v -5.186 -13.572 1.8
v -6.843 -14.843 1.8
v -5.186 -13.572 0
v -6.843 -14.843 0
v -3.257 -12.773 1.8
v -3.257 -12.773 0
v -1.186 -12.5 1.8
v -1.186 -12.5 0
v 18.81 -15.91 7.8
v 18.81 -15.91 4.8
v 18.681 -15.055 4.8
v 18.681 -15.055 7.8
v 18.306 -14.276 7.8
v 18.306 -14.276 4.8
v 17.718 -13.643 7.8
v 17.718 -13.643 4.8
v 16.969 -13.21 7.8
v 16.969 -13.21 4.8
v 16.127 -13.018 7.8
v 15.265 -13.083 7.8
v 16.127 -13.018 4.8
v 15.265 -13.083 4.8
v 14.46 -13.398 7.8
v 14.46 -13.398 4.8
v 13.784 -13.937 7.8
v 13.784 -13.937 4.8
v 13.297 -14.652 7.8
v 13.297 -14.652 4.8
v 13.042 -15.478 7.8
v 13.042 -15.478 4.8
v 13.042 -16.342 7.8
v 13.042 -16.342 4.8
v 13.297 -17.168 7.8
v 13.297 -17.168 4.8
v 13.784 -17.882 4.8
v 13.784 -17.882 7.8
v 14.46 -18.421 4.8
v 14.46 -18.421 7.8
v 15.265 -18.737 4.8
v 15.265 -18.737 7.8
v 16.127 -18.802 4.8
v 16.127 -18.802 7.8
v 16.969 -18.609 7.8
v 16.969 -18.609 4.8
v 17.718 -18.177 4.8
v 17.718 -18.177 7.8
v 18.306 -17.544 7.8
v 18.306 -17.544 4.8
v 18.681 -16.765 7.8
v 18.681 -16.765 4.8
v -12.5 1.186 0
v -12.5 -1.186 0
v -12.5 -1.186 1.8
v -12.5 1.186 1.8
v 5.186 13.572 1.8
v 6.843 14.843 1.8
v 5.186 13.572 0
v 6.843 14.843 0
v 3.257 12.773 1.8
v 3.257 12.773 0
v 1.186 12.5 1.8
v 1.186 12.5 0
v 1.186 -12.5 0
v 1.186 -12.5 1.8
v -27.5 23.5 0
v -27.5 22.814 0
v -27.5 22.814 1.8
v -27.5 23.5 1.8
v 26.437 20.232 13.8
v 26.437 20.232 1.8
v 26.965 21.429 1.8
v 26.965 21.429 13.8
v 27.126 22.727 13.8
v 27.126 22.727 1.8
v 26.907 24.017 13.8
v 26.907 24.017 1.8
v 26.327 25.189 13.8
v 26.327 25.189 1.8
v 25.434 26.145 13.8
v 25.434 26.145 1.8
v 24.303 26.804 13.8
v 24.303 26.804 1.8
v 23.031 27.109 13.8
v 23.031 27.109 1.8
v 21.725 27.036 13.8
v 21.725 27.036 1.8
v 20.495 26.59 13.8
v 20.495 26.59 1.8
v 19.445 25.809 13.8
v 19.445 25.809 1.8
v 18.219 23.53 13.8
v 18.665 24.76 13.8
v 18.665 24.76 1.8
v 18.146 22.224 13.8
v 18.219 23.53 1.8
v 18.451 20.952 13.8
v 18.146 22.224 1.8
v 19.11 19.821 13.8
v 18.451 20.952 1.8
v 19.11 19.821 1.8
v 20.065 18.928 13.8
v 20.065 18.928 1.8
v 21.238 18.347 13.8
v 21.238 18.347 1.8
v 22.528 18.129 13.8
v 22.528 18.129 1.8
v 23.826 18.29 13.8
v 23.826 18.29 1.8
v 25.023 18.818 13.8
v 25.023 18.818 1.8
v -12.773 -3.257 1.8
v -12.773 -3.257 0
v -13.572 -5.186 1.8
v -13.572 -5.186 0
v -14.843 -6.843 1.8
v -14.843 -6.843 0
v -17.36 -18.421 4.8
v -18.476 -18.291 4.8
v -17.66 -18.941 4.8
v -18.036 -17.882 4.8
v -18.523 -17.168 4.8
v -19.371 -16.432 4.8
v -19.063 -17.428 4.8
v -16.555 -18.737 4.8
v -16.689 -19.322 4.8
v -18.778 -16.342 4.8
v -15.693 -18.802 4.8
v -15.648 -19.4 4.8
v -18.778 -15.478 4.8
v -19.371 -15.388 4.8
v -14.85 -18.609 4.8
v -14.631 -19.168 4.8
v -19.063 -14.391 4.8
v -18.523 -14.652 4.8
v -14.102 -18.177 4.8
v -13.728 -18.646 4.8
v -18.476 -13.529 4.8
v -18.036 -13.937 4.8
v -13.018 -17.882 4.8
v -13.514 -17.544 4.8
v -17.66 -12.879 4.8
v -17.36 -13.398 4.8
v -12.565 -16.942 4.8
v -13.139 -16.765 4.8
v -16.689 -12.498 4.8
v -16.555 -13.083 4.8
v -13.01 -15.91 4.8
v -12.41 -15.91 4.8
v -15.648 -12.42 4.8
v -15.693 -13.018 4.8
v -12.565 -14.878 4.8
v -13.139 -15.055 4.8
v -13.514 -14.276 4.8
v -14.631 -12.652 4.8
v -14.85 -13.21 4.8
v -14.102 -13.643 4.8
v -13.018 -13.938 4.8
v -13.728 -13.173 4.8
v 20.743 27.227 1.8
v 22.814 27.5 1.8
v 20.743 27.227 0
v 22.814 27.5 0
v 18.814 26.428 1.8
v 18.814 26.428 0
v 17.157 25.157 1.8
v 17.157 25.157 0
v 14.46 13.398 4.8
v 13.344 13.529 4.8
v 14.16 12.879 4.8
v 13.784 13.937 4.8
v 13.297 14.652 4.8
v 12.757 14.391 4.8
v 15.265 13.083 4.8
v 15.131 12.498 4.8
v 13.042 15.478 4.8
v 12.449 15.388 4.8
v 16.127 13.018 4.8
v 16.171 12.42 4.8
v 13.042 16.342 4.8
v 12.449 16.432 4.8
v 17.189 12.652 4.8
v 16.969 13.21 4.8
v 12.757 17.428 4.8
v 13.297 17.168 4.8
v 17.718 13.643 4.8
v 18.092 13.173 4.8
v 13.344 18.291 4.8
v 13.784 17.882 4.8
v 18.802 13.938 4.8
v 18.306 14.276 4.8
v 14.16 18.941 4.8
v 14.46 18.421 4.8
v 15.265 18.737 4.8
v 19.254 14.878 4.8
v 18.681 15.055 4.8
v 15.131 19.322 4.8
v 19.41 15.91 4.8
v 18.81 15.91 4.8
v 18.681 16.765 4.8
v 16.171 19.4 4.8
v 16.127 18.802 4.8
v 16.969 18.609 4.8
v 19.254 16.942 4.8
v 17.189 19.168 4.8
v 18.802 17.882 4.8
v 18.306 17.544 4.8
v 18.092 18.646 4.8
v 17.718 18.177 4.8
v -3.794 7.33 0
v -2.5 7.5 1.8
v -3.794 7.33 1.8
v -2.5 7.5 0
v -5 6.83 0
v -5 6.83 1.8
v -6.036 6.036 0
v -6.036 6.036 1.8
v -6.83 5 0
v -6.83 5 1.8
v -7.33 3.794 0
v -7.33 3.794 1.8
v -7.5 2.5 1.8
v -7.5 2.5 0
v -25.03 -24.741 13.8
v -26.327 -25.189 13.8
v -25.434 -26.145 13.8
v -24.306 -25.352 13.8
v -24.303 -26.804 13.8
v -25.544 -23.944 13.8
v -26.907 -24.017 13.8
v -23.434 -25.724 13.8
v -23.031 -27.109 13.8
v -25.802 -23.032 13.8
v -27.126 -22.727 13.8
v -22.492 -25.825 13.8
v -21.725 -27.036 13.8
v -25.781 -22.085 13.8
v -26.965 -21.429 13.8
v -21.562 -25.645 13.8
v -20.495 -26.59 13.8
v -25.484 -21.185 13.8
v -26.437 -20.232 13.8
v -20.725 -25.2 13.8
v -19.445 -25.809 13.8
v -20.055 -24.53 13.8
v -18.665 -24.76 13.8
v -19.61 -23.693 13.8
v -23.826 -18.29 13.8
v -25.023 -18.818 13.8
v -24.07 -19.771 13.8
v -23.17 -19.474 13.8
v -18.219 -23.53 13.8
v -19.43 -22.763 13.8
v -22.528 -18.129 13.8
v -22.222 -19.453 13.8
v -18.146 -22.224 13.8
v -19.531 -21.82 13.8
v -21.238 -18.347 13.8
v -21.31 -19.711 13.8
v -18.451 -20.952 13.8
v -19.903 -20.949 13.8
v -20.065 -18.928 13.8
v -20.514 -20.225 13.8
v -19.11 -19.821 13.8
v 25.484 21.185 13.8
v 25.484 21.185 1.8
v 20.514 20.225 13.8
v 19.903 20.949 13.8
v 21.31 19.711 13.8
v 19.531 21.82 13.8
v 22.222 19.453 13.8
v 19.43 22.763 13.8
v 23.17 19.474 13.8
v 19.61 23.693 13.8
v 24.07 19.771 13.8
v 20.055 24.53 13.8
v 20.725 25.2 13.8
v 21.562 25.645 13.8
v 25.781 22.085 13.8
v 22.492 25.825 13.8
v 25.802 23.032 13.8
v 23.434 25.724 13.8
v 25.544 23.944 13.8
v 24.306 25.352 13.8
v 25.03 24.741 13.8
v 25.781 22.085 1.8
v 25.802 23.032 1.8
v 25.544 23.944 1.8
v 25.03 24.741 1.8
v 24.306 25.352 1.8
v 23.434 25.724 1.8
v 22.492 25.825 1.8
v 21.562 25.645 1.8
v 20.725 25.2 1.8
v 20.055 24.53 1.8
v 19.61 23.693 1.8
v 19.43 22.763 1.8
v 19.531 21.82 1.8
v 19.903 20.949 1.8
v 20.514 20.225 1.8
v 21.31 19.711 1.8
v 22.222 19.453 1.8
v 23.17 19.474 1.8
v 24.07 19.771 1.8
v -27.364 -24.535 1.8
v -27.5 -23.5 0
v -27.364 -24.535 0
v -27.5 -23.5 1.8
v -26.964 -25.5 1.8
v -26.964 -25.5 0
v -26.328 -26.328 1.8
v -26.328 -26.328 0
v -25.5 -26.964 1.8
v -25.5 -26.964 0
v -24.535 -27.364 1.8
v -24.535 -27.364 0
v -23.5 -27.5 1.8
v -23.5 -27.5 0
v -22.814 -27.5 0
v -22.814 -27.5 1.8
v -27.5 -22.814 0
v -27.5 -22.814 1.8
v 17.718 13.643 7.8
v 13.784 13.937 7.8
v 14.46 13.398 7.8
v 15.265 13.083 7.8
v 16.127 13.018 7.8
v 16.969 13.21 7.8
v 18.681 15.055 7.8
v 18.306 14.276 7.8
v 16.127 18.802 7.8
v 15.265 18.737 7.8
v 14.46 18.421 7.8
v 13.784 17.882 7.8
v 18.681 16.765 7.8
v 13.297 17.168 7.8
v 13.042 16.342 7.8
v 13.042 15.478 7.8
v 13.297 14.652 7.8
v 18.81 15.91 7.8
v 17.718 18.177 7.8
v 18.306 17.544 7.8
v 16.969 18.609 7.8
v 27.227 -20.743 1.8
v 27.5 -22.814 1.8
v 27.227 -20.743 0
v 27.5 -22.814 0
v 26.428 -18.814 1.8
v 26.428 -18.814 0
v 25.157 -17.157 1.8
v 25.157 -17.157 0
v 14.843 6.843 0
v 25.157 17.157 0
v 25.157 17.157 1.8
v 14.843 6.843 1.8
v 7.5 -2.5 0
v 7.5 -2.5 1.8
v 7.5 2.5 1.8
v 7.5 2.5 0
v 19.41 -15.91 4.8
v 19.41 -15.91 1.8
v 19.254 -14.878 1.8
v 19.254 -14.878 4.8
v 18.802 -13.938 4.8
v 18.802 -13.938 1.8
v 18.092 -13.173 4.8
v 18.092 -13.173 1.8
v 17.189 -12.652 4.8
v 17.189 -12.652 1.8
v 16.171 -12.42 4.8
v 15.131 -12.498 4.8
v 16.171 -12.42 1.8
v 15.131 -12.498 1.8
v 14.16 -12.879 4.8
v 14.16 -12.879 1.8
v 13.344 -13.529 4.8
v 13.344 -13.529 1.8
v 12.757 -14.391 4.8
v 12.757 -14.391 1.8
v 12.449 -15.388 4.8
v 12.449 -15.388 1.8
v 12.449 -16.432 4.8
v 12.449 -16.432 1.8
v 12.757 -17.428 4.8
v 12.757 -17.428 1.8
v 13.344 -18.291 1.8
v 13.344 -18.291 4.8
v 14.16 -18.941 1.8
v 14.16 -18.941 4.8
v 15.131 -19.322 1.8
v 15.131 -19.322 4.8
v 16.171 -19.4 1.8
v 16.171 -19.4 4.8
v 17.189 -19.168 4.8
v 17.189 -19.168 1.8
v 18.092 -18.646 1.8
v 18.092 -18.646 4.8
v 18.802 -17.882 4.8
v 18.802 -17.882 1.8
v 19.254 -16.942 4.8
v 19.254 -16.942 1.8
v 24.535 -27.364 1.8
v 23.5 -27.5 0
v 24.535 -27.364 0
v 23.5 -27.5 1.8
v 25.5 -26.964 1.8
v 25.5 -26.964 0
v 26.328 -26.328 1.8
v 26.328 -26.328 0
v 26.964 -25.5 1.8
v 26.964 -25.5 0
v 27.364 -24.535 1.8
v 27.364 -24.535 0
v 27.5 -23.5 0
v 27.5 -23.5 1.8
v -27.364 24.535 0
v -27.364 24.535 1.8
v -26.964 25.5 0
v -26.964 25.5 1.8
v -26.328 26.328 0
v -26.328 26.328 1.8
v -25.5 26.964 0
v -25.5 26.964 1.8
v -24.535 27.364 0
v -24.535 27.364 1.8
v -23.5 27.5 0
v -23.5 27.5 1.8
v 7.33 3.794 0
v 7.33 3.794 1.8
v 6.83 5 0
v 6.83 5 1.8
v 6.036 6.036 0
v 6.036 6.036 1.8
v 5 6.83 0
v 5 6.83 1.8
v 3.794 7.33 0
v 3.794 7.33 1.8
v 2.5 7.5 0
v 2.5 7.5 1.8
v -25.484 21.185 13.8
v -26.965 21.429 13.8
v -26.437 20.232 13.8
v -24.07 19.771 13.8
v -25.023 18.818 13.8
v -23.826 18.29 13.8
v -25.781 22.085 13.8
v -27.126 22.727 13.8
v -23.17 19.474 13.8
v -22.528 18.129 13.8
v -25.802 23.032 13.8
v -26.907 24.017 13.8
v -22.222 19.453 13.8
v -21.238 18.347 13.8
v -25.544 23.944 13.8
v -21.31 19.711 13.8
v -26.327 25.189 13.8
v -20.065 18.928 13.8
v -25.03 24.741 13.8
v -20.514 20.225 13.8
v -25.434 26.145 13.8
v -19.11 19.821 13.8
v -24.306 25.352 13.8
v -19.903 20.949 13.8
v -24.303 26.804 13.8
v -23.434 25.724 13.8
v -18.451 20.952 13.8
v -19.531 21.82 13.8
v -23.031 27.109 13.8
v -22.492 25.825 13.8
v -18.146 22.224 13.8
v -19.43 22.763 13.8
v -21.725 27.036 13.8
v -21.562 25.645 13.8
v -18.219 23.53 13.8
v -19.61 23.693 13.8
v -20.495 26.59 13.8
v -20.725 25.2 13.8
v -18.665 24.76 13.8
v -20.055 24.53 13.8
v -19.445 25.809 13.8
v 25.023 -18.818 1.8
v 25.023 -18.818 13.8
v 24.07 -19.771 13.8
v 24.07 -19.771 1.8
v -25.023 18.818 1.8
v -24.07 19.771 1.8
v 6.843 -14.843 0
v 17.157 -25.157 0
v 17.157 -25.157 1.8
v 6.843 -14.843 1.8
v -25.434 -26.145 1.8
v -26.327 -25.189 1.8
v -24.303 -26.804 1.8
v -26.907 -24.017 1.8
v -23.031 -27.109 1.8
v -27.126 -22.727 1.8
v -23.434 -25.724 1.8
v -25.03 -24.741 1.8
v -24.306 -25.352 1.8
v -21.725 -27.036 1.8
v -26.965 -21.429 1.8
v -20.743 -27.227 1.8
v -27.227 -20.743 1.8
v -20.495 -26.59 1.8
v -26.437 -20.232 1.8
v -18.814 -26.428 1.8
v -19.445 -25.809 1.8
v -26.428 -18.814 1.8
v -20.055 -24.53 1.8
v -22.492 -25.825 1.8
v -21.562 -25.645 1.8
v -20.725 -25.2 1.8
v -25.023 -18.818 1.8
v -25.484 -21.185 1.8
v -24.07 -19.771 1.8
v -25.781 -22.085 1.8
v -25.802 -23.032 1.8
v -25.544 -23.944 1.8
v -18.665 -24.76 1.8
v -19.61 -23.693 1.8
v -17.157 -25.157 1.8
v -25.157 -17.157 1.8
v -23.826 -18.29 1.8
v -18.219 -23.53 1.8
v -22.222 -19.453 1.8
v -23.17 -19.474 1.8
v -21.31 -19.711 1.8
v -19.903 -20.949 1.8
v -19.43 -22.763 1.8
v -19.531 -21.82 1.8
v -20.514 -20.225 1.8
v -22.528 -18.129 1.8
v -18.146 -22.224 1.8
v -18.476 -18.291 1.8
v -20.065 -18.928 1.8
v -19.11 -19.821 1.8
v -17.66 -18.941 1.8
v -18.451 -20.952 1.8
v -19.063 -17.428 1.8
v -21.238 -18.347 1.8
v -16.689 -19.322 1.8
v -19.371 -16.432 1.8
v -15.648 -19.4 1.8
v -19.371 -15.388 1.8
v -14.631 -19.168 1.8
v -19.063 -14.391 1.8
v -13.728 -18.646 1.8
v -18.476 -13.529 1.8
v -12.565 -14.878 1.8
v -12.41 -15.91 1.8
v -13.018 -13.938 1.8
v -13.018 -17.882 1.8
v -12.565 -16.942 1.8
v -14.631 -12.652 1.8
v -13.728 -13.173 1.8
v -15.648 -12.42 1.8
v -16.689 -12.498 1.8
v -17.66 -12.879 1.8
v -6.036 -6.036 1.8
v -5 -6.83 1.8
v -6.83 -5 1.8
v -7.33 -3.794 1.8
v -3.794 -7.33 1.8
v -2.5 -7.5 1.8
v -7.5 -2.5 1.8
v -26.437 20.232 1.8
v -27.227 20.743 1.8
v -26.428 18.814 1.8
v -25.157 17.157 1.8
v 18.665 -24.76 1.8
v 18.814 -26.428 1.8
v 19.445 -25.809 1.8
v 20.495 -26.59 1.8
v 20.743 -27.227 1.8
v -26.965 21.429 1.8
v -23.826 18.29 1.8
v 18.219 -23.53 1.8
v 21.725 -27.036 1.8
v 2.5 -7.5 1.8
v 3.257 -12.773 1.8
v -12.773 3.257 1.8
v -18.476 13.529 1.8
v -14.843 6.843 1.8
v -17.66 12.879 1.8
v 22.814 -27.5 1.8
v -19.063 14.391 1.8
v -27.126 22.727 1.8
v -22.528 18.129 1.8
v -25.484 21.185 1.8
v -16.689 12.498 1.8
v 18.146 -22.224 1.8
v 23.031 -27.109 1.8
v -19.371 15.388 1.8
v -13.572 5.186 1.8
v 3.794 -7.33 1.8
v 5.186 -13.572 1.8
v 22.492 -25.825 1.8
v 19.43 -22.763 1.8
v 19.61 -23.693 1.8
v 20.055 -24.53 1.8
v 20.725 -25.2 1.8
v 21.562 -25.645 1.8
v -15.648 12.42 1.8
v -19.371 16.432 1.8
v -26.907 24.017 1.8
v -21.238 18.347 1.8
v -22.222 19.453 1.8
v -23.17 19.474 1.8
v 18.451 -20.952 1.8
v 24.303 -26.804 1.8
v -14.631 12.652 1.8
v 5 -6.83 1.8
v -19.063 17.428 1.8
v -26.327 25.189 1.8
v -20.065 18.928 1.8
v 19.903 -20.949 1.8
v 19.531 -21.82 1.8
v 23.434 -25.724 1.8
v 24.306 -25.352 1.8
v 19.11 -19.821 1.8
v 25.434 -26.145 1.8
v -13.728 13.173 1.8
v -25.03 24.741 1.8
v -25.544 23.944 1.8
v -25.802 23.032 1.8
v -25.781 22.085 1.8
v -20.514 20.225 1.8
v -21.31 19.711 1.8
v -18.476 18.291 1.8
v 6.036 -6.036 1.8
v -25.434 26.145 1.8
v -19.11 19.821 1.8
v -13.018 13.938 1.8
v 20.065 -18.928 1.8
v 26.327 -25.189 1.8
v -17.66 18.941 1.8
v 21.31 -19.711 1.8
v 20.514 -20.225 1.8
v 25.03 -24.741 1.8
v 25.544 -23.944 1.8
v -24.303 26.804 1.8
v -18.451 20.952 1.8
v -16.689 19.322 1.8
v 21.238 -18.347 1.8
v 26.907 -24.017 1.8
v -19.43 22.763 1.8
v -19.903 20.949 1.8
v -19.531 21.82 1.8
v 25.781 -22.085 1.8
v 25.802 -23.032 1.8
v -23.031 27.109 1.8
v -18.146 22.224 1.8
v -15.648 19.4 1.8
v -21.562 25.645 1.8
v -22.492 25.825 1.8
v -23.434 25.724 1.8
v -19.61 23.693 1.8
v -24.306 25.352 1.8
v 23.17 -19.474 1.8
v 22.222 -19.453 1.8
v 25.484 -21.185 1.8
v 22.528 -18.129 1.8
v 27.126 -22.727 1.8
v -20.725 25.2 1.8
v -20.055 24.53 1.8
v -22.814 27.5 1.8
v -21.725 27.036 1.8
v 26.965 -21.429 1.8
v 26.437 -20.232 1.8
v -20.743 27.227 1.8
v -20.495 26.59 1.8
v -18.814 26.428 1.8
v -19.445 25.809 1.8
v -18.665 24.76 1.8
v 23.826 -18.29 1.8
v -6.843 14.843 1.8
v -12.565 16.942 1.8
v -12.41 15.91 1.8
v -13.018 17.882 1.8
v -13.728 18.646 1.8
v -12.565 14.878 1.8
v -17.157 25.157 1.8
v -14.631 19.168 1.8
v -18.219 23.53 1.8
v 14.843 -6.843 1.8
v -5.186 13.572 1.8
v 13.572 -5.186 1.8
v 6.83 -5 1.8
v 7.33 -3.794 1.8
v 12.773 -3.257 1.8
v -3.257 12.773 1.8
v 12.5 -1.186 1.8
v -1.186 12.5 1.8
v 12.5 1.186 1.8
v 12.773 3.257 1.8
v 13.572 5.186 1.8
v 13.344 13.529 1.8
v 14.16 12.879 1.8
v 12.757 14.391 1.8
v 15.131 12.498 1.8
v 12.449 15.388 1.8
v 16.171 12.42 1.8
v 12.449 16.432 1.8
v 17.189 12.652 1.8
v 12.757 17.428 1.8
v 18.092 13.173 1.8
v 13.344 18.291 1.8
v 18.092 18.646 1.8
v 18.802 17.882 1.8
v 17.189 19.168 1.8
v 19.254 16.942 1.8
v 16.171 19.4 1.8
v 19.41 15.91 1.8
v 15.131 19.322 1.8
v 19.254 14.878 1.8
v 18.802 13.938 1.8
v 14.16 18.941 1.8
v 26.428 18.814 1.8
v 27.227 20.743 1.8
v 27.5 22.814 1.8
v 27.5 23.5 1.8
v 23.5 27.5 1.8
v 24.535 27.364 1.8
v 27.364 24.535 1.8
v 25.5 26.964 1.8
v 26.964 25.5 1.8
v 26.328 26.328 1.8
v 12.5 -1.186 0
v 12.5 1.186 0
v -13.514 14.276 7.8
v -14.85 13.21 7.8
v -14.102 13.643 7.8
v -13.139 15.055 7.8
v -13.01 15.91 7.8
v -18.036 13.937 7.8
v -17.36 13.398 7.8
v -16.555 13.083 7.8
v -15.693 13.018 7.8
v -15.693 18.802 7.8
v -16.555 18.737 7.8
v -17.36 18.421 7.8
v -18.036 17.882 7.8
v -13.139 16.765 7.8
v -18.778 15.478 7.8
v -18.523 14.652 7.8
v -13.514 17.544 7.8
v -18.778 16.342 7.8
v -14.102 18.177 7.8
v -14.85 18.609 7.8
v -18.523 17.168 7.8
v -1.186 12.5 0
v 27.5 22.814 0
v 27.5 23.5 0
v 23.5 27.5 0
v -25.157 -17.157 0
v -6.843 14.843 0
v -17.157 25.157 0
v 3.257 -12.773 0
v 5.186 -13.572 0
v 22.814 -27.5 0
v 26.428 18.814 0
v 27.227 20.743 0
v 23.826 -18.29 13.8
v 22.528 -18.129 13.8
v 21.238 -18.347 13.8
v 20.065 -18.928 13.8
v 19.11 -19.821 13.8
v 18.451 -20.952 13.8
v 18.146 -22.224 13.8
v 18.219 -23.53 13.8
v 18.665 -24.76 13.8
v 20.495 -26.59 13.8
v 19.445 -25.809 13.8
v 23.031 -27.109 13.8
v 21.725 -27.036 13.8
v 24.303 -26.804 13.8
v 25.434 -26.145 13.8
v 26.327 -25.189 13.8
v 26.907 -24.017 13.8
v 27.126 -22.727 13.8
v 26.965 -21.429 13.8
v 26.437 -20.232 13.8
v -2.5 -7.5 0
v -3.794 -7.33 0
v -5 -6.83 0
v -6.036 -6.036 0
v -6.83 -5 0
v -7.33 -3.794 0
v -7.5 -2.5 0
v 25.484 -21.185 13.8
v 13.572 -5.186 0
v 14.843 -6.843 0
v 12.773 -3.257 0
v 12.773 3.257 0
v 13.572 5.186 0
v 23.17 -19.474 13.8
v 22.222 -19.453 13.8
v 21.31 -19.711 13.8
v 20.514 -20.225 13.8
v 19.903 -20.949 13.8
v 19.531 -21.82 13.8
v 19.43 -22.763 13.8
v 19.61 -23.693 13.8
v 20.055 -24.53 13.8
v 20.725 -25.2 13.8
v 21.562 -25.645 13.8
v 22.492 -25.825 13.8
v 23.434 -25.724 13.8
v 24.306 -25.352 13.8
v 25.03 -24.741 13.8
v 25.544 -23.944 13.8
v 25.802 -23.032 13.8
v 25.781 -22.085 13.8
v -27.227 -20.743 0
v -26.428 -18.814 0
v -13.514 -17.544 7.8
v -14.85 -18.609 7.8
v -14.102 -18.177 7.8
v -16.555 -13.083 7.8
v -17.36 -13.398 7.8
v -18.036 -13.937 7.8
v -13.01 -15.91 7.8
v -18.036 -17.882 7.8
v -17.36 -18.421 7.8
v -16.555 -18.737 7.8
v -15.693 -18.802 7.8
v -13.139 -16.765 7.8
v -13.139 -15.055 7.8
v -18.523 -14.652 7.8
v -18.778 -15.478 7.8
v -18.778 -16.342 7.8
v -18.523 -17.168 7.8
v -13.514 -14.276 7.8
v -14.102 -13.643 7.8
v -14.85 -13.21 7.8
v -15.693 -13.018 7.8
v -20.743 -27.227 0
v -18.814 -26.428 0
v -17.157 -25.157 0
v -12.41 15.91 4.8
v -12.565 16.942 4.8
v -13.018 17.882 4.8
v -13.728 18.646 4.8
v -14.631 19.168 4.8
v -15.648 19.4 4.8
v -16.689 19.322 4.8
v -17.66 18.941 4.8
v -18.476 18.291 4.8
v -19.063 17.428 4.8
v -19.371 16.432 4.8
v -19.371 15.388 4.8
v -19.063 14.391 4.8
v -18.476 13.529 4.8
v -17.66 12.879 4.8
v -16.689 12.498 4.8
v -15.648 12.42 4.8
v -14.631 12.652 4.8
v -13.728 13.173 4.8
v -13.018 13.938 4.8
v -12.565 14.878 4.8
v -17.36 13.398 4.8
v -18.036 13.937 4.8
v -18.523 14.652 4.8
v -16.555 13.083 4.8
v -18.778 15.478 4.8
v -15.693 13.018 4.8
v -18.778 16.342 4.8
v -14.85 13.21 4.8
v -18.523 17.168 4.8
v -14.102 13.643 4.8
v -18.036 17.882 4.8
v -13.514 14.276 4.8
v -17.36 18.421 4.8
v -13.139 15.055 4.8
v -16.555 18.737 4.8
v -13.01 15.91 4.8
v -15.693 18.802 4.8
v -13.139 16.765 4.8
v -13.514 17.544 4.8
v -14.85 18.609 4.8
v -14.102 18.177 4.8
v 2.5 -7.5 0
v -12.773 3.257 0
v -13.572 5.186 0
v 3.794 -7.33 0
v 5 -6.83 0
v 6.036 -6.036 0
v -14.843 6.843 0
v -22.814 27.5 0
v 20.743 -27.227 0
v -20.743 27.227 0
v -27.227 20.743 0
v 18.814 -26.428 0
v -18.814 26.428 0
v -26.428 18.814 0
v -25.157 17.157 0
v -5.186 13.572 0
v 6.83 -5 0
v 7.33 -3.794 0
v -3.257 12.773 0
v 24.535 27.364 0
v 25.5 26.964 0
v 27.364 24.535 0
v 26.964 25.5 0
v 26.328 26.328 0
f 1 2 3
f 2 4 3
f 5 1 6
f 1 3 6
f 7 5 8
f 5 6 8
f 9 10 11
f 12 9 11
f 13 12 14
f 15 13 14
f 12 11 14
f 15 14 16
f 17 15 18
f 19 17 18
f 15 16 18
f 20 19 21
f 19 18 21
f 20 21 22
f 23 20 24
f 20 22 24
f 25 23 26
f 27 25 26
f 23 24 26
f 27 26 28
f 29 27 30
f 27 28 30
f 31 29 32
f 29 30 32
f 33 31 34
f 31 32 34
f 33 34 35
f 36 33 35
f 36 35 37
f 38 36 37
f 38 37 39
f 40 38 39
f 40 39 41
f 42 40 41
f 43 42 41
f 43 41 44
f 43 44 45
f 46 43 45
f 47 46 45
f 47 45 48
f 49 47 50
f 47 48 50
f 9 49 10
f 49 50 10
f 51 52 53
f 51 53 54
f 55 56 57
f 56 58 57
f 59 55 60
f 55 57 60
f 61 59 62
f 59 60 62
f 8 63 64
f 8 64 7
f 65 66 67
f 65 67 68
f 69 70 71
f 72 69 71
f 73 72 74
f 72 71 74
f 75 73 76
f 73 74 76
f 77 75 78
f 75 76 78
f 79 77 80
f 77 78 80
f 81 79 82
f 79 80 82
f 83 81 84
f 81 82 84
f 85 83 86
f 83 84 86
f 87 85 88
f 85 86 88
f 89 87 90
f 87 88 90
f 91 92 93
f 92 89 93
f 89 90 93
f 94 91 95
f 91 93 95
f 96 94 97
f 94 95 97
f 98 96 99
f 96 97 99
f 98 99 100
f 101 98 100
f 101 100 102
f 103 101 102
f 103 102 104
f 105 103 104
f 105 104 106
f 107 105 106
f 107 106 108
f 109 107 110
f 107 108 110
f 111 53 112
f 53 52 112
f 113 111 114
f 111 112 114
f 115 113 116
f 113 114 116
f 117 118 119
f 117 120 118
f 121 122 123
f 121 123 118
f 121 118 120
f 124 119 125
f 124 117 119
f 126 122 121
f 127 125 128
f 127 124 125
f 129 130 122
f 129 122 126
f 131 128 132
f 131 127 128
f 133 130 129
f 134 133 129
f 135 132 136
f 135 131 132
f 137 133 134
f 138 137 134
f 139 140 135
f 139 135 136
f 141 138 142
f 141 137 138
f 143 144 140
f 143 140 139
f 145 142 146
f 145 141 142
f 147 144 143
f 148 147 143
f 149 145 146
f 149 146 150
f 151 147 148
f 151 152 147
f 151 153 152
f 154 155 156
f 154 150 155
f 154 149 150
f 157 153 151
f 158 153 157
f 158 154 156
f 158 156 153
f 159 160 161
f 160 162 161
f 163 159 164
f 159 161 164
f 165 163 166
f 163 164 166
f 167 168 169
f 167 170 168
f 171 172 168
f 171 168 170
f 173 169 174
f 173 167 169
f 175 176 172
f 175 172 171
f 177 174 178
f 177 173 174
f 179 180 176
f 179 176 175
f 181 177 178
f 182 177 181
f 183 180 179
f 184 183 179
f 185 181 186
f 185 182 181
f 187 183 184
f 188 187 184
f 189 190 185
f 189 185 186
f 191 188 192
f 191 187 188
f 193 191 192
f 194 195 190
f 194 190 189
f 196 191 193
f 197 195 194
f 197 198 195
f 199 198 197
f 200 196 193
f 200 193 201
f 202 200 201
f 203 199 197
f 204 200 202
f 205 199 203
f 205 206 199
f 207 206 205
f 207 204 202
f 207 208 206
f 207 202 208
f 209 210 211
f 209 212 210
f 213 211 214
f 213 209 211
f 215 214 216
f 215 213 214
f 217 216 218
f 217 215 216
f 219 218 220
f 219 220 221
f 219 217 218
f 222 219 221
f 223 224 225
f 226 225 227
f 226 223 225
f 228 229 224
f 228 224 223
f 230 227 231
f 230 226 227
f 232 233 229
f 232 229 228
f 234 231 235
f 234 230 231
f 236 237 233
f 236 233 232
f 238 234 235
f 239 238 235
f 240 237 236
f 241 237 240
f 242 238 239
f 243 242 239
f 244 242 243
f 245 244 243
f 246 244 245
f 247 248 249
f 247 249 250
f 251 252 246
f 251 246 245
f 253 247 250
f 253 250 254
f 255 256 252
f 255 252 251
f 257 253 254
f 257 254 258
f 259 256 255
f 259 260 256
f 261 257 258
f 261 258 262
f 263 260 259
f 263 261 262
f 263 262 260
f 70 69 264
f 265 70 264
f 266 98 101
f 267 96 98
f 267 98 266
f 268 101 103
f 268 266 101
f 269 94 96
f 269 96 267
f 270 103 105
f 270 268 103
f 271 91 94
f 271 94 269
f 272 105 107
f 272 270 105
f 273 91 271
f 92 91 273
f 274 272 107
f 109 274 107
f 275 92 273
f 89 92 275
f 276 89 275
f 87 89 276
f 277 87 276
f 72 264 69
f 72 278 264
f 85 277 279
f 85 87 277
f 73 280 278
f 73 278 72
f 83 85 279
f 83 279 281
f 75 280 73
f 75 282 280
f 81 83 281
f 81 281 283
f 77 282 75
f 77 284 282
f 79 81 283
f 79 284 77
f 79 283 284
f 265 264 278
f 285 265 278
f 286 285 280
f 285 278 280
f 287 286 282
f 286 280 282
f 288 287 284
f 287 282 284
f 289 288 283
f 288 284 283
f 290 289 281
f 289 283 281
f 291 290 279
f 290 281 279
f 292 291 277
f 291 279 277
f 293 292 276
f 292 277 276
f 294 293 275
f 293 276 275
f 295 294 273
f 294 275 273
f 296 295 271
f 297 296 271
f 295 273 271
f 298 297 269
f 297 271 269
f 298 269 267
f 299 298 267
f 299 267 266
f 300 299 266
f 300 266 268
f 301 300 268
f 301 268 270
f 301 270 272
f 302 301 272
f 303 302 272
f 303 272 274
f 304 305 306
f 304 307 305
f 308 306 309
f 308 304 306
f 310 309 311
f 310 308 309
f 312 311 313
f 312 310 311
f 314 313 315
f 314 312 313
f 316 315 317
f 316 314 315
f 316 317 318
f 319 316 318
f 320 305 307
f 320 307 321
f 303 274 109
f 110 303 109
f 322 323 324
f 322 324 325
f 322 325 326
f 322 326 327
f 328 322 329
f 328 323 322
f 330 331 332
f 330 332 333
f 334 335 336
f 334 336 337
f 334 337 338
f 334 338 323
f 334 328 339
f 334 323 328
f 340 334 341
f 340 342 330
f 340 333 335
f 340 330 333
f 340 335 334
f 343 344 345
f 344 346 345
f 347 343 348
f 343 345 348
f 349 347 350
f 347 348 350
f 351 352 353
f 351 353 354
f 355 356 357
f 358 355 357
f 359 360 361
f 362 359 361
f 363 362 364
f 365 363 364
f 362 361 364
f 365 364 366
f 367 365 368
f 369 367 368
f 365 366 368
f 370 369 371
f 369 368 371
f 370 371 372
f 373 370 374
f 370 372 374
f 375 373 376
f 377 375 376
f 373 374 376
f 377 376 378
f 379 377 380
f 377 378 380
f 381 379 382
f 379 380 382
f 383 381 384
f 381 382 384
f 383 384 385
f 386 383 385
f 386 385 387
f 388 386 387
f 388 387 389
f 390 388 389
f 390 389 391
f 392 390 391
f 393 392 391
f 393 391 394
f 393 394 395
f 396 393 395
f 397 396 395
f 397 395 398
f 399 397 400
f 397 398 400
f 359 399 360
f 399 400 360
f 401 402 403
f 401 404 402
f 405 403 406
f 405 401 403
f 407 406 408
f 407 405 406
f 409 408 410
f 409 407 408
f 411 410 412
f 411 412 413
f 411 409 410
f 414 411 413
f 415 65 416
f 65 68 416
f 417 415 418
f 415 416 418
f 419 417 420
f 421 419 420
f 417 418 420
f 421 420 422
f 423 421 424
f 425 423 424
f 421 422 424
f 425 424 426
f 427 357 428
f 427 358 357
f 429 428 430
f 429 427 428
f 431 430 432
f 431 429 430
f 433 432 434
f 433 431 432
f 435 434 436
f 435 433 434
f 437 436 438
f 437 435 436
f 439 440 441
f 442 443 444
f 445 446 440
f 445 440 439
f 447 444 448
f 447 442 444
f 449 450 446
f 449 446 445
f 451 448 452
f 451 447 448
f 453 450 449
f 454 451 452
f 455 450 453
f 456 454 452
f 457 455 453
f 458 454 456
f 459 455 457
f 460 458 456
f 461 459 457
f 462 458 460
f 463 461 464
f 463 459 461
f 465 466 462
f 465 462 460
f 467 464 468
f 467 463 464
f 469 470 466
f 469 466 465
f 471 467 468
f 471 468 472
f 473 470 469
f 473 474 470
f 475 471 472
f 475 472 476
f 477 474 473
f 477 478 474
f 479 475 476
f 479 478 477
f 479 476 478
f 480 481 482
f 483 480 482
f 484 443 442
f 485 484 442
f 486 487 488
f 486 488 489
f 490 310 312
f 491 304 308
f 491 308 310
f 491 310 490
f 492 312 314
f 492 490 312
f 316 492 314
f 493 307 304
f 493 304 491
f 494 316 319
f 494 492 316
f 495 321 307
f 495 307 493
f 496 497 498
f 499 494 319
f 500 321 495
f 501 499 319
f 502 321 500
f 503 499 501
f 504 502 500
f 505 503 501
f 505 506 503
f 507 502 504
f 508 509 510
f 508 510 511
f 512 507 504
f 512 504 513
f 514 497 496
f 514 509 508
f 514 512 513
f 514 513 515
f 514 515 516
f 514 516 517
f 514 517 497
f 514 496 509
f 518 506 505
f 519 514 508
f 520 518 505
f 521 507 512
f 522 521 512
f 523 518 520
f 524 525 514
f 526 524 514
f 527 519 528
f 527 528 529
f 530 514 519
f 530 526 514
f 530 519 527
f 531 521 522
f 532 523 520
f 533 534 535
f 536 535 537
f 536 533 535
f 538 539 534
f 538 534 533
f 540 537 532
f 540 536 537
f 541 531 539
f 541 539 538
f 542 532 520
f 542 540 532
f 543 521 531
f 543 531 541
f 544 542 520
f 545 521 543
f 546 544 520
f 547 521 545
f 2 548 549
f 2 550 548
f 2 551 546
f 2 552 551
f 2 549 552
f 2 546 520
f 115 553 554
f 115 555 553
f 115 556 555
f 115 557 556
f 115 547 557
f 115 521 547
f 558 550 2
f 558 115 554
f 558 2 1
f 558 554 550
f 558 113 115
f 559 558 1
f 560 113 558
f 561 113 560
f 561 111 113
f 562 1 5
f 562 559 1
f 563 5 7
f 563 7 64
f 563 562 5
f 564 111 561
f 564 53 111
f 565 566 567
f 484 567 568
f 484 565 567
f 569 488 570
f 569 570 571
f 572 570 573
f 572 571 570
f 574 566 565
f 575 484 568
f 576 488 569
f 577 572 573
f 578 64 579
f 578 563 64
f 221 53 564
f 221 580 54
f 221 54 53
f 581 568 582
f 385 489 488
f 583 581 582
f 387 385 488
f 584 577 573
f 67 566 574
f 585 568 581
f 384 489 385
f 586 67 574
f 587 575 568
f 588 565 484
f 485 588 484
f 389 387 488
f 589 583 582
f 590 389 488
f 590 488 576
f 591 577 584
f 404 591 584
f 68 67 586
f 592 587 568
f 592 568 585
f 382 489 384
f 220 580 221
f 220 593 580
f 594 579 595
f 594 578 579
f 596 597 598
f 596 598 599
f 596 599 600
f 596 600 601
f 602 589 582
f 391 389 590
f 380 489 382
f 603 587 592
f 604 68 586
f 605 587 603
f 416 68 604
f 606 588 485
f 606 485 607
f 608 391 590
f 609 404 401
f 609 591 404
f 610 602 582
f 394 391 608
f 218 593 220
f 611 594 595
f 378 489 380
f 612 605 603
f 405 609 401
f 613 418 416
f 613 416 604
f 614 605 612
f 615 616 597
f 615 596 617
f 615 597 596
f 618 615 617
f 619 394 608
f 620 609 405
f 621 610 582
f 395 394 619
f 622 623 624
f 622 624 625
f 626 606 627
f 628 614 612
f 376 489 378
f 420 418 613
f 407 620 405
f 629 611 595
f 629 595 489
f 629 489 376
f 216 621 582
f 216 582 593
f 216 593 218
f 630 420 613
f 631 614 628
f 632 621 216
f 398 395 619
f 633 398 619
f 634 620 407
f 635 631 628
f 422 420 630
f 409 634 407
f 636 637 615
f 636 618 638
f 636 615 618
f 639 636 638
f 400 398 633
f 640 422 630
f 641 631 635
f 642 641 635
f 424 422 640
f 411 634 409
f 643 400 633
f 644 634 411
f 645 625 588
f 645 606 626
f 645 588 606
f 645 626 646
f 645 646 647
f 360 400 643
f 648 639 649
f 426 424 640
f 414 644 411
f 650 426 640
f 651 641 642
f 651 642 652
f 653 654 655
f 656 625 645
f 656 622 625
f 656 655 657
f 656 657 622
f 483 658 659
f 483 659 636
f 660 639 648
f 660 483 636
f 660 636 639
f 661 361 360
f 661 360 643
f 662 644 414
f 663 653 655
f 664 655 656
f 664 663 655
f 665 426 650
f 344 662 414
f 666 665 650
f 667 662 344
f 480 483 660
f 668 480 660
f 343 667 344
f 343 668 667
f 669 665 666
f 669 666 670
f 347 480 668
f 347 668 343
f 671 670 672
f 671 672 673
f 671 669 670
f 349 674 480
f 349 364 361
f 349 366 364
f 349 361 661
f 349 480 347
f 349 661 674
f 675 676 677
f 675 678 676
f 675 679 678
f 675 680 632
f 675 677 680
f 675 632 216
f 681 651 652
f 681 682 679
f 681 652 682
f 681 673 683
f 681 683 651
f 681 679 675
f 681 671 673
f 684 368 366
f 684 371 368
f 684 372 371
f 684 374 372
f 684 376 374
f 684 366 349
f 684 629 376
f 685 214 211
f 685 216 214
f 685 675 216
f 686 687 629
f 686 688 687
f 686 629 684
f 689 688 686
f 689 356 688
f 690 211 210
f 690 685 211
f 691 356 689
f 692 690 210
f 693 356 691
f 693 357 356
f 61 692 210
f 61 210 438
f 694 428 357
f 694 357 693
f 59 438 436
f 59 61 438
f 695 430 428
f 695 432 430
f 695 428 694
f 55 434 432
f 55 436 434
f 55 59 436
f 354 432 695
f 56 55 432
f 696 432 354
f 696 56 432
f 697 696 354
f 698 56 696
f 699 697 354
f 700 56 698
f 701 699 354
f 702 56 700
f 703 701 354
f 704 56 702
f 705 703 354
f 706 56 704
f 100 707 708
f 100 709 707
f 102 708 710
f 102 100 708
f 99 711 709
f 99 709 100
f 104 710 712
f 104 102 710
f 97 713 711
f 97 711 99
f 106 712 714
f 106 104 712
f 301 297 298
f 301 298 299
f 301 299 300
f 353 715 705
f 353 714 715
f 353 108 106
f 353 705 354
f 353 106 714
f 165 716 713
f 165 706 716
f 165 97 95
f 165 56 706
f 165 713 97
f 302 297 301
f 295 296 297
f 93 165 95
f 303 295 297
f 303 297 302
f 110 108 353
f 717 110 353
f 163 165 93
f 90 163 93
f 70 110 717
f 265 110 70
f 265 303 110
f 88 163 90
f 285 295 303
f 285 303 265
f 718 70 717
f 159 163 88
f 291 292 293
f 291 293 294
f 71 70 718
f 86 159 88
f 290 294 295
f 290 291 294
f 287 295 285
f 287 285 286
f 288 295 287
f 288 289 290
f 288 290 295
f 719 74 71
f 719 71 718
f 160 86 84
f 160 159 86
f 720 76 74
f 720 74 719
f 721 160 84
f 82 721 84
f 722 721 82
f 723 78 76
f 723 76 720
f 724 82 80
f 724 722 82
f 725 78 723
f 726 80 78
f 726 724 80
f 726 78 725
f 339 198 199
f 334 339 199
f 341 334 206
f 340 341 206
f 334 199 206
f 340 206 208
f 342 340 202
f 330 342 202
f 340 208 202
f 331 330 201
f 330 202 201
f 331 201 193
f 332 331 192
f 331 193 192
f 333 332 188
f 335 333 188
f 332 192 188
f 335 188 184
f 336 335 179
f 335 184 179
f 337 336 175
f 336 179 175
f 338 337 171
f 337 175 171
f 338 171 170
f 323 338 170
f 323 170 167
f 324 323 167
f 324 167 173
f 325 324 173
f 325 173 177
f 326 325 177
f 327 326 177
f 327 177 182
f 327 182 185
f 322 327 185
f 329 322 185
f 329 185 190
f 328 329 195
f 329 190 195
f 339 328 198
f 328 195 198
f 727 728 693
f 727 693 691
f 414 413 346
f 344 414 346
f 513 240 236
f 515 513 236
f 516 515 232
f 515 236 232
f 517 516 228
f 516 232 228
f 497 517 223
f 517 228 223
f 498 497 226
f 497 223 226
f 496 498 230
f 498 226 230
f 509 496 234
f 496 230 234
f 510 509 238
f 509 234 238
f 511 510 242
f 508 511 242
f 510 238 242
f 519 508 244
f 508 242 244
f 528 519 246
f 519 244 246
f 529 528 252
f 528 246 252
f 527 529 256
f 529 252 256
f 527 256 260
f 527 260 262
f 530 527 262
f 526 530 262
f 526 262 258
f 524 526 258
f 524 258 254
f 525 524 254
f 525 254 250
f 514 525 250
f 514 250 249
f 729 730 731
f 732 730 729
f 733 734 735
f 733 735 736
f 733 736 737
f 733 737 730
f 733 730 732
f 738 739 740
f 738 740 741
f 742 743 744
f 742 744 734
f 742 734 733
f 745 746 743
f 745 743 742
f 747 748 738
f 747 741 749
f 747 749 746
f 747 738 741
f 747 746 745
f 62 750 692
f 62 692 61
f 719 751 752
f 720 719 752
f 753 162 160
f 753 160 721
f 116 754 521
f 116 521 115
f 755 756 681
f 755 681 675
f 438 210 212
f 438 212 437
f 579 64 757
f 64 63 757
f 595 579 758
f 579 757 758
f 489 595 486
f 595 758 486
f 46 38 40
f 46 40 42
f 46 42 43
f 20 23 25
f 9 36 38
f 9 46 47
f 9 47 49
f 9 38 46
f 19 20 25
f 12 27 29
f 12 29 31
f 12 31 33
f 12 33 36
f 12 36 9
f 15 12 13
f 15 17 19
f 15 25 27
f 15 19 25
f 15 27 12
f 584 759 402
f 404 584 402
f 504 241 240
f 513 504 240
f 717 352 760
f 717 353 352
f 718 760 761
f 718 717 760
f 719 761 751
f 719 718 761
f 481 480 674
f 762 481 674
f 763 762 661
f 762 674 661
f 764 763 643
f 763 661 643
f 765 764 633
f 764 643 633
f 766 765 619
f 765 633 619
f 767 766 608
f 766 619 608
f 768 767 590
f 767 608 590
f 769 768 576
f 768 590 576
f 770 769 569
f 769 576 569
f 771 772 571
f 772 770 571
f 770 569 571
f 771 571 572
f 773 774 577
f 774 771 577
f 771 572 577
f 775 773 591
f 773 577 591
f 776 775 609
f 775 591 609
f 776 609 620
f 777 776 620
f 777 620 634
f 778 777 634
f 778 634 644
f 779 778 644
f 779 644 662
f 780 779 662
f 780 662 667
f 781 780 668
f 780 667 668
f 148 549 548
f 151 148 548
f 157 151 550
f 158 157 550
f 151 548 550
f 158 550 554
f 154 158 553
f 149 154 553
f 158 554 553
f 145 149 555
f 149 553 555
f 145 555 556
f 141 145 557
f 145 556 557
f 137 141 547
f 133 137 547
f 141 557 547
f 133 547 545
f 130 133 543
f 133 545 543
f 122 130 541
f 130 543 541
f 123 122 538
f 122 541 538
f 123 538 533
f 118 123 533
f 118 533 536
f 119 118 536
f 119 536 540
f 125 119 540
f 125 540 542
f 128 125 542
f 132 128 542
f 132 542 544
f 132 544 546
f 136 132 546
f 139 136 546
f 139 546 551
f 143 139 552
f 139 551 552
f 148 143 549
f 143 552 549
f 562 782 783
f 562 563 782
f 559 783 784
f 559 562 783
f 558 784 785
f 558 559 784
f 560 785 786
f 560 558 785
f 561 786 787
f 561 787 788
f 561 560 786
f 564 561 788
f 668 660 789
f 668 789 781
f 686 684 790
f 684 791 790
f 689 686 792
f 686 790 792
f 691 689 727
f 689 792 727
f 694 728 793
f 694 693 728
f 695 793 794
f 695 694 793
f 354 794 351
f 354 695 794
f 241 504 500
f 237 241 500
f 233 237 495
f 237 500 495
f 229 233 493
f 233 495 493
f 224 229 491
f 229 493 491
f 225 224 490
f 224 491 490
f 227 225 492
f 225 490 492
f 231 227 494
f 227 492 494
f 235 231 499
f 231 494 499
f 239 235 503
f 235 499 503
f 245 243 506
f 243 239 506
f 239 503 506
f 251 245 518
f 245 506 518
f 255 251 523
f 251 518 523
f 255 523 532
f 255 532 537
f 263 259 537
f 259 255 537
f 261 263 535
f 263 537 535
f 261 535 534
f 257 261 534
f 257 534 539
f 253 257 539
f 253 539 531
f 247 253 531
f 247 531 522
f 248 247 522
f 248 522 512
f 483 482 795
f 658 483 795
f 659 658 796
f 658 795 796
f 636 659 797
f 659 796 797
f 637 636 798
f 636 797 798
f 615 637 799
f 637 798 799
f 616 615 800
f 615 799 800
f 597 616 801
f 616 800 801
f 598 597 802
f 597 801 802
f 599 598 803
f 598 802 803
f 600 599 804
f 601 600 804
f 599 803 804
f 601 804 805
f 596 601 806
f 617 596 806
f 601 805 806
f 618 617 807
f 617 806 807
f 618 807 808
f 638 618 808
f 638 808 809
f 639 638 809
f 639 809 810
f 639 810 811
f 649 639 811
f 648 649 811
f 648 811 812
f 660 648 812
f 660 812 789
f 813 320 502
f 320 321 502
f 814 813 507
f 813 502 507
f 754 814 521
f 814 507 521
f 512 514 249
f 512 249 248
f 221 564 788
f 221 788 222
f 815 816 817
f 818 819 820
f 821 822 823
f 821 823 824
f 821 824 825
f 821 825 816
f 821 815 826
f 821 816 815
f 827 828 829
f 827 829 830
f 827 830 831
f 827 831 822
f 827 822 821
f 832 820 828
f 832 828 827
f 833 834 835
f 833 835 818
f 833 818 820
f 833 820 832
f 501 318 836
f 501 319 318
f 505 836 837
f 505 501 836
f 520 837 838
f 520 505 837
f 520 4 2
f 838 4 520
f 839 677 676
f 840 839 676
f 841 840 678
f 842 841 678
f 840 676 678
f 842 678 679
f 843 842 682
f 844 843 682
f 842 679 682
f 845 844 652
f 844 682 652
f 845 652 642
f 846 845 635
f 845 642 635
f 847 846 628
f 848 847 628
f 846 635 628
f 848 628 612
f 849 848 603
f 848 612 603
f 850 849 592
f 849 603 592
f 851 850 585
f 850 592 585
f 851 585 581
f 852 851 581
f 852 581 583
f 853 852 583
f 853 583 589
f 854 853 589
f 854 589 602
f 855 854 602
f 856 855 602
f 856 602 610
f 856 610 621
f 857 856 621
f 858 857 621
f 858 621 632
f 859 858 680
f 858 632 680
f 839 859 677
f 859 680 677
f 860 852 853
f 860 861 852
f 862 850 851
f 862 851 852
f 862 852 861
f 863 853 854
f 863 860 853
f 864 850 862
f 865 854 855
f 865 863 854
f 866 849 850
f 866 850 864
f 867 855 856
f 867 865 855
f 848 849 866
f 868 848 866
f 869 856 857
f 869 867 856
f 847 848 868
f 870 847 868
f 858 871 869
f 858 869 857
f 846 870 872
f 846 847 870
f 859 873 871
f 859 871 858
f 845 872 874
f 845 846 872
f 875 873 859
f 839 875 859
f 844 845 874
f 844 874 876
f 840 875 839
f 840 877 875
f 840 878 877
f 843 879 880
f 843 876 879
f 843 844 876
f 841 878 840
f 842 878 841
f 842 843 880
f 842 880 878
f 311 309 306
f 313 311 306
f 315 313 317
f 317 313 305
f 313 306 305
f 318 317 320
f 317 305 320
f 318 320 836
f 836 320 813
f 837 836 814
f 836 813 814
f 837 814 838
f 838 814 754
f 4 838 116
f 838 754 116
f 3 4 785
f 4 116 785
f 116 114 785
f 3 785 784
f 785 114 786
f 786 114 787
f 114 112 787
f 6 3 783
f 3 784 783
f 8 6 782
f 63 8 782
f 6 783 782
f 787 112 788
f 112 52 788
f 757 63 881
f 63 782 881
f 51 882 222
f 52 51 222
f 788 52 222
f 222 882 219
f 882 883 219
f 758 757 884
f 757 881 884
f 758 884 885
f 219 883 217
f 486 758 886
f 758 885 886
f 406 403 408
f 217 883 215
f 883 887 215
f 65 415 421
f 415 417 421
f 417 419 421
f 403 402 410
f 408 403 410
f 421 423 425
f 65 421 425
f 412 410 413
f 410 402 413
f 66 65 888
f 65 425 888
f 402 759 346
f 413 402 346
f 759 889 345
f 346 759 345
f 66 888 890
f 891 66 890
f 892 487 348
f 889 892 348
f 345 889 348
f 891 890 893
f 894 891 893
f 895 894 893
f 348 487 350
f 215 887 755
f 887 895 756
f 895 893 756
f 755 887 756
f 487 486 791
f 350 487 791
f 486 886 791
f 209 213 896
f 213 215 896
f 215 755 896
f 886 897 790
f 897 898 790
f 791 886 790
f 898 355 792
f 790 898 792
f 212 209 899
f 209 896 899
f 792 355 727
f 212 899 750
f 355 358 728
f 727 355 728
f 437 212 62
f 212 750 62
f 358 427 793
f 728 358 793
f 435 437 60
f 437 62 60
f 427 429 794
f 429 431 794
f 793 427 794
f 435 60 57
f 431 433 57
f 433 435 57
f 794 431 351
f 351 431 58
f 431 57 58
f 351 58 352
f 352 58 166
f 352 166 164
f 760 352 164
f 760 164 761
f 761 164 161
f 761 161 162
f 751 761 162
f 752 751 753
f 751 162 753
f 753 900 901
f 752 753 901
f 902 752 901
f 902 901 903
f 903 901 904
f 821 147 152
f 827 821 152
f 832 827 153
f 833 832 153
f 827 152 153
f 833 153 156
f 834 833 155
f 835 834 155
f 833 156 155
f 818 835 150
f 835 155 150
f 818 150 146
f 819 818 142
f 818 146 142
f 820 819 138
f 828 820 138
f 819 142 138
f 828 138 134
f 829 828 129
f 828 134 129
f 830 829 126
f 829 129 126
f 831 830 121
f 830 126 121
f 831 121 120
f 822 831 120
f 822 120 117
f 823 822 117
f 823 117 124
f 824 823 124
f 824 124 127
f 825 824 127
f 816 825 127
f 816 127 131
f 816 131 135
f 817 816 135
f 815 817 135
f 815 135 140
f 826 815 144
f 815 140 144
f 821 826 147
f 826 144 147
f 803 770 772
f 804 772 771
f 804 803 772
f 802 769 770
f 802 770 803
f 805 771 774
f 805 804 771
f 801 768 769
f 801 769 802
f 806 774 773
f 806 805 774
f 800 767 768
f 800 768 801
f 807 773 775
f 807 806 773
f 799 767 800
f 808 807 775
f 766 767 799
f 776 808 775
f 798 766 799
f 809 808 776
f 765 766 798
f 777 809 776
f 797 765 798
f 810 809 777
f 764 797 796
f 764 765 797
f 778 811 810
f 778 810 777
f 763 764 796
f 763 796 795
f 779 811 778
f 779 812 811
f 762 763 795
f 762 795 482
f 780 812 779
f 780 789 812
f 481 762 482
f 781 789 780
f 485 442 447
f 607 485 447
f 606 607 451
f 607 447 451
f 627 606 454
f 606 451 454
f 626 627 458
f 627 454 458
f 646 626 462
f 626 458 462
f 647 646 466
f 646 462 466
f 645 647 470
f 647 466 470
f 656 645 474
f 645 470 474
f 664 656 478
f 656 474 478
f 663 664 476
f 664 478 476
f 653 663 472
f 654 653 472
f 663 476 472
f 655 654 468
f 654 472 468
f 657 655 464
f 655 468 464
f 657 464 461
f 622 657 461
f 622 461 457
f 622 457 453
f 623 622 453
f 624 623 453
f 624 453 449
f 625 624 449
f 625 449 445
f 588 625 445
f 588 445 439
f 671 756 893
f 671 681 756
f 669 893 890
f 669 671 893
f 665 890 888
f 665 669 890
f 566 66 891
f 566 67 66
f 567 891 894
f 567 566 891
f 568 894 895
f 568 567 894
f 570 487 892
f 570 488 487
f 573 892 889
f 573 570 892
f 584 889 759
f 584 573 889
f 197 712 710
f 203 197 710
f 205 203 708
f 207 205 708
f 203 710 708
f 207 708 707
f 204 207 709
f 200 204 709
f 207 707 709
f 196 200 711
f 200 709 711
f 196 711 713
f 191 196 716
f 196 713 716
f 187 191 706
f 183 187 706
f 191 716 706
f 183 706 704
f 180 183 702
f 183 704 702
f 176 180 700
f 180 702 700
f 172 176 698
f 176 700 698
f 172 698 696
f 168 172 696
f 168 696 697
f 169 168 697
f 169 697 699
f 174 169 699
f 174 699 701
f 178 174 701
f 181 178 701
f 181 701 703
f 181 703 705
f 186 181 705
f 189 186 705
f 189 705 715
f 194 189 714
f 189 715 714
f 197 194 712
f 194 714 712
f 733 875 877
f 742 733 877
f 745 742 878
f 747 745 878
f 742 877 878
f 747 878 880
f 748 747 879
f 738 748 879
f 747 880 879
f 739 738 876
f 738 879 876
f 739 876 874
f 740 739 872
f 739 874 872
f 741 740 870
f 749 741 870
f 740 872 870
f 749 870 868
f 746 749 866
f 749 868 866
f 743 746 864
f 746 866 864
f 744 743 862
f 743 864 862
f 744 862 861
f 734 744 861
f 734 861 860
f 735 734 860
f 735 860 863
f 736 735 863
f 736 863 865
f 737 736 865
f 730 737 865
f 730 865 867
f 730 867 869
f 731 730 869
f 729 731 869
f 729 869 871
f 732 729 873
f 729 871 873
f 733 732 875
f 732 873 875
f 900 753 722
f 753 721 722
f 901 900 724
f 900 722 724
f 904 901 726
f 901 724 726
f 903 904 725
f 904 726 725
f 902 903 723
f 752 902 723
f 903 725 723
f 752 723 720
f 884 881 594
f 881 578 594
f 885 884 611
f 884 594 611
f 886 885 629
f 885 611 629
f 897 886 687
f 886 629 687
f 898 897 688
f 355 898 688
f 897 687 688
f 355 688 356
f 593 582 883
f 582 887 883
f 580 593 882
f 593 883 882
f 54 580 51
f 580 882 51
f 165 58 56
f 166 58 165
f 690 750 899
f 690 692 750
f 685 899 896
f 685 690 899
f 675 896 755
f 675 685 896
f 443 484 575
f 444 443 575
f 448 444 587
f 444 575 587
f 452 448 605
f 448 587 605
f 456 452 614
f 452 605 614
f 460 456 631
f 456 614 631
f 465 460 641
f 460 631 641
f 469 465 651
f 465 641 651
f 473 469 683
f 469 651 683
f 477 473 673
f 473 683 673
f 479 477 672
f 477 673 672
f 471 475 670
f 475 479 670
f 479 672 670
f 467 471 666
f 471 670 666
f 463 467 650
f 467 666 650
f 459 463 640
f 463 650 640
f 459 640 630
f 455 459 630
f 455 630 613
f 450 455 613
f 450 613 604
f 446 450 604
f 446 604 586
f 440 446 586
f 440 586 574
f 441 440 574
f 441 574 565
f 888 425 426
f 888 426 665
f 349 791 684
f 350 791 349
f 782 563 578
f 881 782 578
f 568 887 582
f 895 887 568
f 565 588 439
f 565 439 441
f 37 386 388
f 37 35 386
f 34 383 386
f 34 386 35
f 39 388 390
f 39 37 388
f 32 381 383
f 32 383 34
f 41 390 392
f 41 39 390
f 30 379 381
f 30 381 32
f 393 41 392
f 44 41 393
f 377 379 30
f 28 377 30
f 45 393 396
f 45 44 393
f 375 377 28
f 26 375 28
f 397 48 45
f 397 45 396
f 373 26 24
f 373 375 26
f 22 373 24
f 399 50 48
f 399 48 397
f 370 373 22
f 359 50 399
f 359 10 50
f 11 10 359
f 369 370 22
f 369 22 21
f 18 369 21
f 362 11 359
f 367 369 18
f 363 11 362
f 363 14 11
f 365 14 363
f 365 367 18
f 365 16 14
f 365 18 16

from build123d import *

# Parameters (mm, degrees)
F0_W      = 55
F0_H      = 55
F1_DEPTH  = 1.8
F2_R      = 3.5
F3_DEPTH  = 3
F4_R      = 2.9
F5_DEPTH  = 3
F6_R      = 4.5
F7_DEPTH  = 12
F8_R      = 3.2
F9_DEPTH  = 12
F10_R     = 4
F11_W     = 15
F11_H     = 15
F12_DEPTH = 20
F14_DEPTH = 25
F15_R     = 8
F16_R     = 5


with BuildPart() as f1:
    # F0 (on Top) → F1 (new body)
    with BuildSketch(Plane.XY):
        Rectangle(F0_W, F0_H)
    extrude(amount=F1_DEPTH)

    # F2 (on face) → F3 (join)
    with BuildSketch(Plane.XY.offset(1.8)):
        with Locations((-15.9099025767, 15.9099025767)):
            Circle(F2_R)
        with Locations((15.9099025767, 15.9099025767)):
            Circle(F2_R)
        with Locations((-15.9099025767, -15.9099025767)):
            Circle(F2_R)
        with Locations((15.9099025767, -15.9099025767)):
            Circle(F2_R)
    extrude(amount=F3_DEPTH)

    # F4 (on face) → F5 (join)
    with BuildSketch(Plane.XY.offset(4.8)):
        with Locations((-15.9099025767, 15.9099025767)):
            Circle(F4_R)
        with Locations((15.9099025767, 15.9099025767)):
            Circle(F4_R)
        with Locations((-15.9099025767, -15.9099025767)):
            Circle(F4_R)
        with Locations((15.9099025767, -15.9099025767)):
            Circle(F4_R)
    extrude(amount=F5_DEPTH)

    # F6 (on face) → F7 (join)
    with BuildSketch(Plane.XY.offset(1.8)):
        with Locations((-22.627416998, 22.627416998)):
            Circle(F6_R)
        with Locations((22.627416998, 22.627416998)):
            Circle(F6_R)
        with Locations((22.627416998, -22.627416998)):
            Circle(F6_R)
        with Locations((-22.627416998, -22.627416998)):
            Circle(F6_R)
    extrude(amount=F7_DEPTH)

    # F8 (on face) → F9 (cut)
    with BuildSketch(Plane.XY.offset(13.8)):
        with Locations((-22.627416998, -22.627416998)):
            Circle(F8_R)
        with Locations((22.627416998, -22.627416998)):
            Circle(F8_R)
        with Locations((-22.627416998, 22.627416998)):
            Circle(F8_R)
        with Locations((22.627416998, 22.627416998)):
            Circle(F8_R)
    extrude(amount=-F9_DEPTH, mode=Mode.SUBTRACT)

    # F10
    f10_edges = [f1.edges().sort_by_distance(p)[0] for p in [
        (27.5, -27.5, 0.9),
        (-27.5, -27.5, 0.9),
        (-27.5, 27.5, 0.9),
        (27.5, 27.5, 0.9),
    ]]
    fillet(f10_edges, radius=F10_R)

    # F11 (on face) → F12 (cut, symmetric)
    with BuildSketch(Plane.XY.offset(1.8)):
        Polygon((-12.5, 4.5), (-27.5, 19.5), (-27.5, -19.5), (-12.5, -4.5), align=None)
        Polygon((19.5, 27.5), (-19.5, 27.5), (-4.5, 12.5), (4.5, 12.5), align=None)
        Polygon((27.5, -19.5), (27.5, 19.5), (12.5, 4.5), (12.5, -4.5), align=None)
        Polygon((-4.5, -12.5), (-19.5, -27.5), (19.5, -27.5), (4.5, -12.5), align=None)
        Rectangle(F11_W, F11_H)
    extrude(amount=F12_DEPTH, both=True, mode=Mode.SUBTRACT)

    # F13 (on face) → F14 (cut)
    with BuildSketch(Plane.XY.offset(1.8)):
        Polygon((-26.8456843913, 19.823363167), (-25.4314708289, 18.4091496047), (-22.6030437041, 21.2375767294), (-24.0172572665, 22.6517902918), align=None)
        Polygon((22.6030437041, 21.2375767294), (25.4314708289, 18.4091496047), (26.8456843913, 19.823363167), (24.0172572665, 22.6517902918), align=None)
        Polygon((-25.4314708289, -18.4091496047), (-26.8456843913, -19.823363167), (-24.0172572665, -22.6517902918), (-22.6030437041, -21.2375767294), align=None)
        Polygon((26.8456843913, -19.823363167), (25.4314708289, -18.4091496047), (22.6030437041, -21.2375767294), (24.0172572665, -22.6517902918), align=None)
    extrude(amount=F14_DEPTH, mode=Mode.SUBTRACT)

    # F15
    f15_edges = [f1.edges().sort_by_distance(p)[0] for p in [
        (19.5, -27.5, 0.9),
        (4.5, -12.5, 0.9),
        (-4.5, -12.5, 0.9),
        (-19.5, -27.5, 0.9),
        (-27.5, -19.5, 0.9),
        (-12.5, -4.5, 0.9),
        (-12.5, 4.5, 0.9),
        (-27.5, 19.5, 0.9),
        (-19.5, 27.5, 0.9),
        (-4.5, 12.5, 0.9),
        (4.5, 12.5, 0.9),
        (19.5, 27.5, 0.9),
        (12.5, -4.5, 0.9),
        (12.5, 4.5, 0.9),
        (27.5, 19.5, 0.9),
        (27.5, -19.5, 0.9),
    ]]
    fillet(f15_edges, radius=F15_R)

    # F16
    f16_edges = [f1.edges().sort_by_distance(p)[0] for p in [
        (-7.5, 7.5, 0.9),
        (7.5, 7.5, 0.9),
        (7.5, -7.5, 0.9),
        (-7.5, -7.5, 0.9),
    ]]
    fillet(f16_edges, radius=F16_R)


solid = f1.part
